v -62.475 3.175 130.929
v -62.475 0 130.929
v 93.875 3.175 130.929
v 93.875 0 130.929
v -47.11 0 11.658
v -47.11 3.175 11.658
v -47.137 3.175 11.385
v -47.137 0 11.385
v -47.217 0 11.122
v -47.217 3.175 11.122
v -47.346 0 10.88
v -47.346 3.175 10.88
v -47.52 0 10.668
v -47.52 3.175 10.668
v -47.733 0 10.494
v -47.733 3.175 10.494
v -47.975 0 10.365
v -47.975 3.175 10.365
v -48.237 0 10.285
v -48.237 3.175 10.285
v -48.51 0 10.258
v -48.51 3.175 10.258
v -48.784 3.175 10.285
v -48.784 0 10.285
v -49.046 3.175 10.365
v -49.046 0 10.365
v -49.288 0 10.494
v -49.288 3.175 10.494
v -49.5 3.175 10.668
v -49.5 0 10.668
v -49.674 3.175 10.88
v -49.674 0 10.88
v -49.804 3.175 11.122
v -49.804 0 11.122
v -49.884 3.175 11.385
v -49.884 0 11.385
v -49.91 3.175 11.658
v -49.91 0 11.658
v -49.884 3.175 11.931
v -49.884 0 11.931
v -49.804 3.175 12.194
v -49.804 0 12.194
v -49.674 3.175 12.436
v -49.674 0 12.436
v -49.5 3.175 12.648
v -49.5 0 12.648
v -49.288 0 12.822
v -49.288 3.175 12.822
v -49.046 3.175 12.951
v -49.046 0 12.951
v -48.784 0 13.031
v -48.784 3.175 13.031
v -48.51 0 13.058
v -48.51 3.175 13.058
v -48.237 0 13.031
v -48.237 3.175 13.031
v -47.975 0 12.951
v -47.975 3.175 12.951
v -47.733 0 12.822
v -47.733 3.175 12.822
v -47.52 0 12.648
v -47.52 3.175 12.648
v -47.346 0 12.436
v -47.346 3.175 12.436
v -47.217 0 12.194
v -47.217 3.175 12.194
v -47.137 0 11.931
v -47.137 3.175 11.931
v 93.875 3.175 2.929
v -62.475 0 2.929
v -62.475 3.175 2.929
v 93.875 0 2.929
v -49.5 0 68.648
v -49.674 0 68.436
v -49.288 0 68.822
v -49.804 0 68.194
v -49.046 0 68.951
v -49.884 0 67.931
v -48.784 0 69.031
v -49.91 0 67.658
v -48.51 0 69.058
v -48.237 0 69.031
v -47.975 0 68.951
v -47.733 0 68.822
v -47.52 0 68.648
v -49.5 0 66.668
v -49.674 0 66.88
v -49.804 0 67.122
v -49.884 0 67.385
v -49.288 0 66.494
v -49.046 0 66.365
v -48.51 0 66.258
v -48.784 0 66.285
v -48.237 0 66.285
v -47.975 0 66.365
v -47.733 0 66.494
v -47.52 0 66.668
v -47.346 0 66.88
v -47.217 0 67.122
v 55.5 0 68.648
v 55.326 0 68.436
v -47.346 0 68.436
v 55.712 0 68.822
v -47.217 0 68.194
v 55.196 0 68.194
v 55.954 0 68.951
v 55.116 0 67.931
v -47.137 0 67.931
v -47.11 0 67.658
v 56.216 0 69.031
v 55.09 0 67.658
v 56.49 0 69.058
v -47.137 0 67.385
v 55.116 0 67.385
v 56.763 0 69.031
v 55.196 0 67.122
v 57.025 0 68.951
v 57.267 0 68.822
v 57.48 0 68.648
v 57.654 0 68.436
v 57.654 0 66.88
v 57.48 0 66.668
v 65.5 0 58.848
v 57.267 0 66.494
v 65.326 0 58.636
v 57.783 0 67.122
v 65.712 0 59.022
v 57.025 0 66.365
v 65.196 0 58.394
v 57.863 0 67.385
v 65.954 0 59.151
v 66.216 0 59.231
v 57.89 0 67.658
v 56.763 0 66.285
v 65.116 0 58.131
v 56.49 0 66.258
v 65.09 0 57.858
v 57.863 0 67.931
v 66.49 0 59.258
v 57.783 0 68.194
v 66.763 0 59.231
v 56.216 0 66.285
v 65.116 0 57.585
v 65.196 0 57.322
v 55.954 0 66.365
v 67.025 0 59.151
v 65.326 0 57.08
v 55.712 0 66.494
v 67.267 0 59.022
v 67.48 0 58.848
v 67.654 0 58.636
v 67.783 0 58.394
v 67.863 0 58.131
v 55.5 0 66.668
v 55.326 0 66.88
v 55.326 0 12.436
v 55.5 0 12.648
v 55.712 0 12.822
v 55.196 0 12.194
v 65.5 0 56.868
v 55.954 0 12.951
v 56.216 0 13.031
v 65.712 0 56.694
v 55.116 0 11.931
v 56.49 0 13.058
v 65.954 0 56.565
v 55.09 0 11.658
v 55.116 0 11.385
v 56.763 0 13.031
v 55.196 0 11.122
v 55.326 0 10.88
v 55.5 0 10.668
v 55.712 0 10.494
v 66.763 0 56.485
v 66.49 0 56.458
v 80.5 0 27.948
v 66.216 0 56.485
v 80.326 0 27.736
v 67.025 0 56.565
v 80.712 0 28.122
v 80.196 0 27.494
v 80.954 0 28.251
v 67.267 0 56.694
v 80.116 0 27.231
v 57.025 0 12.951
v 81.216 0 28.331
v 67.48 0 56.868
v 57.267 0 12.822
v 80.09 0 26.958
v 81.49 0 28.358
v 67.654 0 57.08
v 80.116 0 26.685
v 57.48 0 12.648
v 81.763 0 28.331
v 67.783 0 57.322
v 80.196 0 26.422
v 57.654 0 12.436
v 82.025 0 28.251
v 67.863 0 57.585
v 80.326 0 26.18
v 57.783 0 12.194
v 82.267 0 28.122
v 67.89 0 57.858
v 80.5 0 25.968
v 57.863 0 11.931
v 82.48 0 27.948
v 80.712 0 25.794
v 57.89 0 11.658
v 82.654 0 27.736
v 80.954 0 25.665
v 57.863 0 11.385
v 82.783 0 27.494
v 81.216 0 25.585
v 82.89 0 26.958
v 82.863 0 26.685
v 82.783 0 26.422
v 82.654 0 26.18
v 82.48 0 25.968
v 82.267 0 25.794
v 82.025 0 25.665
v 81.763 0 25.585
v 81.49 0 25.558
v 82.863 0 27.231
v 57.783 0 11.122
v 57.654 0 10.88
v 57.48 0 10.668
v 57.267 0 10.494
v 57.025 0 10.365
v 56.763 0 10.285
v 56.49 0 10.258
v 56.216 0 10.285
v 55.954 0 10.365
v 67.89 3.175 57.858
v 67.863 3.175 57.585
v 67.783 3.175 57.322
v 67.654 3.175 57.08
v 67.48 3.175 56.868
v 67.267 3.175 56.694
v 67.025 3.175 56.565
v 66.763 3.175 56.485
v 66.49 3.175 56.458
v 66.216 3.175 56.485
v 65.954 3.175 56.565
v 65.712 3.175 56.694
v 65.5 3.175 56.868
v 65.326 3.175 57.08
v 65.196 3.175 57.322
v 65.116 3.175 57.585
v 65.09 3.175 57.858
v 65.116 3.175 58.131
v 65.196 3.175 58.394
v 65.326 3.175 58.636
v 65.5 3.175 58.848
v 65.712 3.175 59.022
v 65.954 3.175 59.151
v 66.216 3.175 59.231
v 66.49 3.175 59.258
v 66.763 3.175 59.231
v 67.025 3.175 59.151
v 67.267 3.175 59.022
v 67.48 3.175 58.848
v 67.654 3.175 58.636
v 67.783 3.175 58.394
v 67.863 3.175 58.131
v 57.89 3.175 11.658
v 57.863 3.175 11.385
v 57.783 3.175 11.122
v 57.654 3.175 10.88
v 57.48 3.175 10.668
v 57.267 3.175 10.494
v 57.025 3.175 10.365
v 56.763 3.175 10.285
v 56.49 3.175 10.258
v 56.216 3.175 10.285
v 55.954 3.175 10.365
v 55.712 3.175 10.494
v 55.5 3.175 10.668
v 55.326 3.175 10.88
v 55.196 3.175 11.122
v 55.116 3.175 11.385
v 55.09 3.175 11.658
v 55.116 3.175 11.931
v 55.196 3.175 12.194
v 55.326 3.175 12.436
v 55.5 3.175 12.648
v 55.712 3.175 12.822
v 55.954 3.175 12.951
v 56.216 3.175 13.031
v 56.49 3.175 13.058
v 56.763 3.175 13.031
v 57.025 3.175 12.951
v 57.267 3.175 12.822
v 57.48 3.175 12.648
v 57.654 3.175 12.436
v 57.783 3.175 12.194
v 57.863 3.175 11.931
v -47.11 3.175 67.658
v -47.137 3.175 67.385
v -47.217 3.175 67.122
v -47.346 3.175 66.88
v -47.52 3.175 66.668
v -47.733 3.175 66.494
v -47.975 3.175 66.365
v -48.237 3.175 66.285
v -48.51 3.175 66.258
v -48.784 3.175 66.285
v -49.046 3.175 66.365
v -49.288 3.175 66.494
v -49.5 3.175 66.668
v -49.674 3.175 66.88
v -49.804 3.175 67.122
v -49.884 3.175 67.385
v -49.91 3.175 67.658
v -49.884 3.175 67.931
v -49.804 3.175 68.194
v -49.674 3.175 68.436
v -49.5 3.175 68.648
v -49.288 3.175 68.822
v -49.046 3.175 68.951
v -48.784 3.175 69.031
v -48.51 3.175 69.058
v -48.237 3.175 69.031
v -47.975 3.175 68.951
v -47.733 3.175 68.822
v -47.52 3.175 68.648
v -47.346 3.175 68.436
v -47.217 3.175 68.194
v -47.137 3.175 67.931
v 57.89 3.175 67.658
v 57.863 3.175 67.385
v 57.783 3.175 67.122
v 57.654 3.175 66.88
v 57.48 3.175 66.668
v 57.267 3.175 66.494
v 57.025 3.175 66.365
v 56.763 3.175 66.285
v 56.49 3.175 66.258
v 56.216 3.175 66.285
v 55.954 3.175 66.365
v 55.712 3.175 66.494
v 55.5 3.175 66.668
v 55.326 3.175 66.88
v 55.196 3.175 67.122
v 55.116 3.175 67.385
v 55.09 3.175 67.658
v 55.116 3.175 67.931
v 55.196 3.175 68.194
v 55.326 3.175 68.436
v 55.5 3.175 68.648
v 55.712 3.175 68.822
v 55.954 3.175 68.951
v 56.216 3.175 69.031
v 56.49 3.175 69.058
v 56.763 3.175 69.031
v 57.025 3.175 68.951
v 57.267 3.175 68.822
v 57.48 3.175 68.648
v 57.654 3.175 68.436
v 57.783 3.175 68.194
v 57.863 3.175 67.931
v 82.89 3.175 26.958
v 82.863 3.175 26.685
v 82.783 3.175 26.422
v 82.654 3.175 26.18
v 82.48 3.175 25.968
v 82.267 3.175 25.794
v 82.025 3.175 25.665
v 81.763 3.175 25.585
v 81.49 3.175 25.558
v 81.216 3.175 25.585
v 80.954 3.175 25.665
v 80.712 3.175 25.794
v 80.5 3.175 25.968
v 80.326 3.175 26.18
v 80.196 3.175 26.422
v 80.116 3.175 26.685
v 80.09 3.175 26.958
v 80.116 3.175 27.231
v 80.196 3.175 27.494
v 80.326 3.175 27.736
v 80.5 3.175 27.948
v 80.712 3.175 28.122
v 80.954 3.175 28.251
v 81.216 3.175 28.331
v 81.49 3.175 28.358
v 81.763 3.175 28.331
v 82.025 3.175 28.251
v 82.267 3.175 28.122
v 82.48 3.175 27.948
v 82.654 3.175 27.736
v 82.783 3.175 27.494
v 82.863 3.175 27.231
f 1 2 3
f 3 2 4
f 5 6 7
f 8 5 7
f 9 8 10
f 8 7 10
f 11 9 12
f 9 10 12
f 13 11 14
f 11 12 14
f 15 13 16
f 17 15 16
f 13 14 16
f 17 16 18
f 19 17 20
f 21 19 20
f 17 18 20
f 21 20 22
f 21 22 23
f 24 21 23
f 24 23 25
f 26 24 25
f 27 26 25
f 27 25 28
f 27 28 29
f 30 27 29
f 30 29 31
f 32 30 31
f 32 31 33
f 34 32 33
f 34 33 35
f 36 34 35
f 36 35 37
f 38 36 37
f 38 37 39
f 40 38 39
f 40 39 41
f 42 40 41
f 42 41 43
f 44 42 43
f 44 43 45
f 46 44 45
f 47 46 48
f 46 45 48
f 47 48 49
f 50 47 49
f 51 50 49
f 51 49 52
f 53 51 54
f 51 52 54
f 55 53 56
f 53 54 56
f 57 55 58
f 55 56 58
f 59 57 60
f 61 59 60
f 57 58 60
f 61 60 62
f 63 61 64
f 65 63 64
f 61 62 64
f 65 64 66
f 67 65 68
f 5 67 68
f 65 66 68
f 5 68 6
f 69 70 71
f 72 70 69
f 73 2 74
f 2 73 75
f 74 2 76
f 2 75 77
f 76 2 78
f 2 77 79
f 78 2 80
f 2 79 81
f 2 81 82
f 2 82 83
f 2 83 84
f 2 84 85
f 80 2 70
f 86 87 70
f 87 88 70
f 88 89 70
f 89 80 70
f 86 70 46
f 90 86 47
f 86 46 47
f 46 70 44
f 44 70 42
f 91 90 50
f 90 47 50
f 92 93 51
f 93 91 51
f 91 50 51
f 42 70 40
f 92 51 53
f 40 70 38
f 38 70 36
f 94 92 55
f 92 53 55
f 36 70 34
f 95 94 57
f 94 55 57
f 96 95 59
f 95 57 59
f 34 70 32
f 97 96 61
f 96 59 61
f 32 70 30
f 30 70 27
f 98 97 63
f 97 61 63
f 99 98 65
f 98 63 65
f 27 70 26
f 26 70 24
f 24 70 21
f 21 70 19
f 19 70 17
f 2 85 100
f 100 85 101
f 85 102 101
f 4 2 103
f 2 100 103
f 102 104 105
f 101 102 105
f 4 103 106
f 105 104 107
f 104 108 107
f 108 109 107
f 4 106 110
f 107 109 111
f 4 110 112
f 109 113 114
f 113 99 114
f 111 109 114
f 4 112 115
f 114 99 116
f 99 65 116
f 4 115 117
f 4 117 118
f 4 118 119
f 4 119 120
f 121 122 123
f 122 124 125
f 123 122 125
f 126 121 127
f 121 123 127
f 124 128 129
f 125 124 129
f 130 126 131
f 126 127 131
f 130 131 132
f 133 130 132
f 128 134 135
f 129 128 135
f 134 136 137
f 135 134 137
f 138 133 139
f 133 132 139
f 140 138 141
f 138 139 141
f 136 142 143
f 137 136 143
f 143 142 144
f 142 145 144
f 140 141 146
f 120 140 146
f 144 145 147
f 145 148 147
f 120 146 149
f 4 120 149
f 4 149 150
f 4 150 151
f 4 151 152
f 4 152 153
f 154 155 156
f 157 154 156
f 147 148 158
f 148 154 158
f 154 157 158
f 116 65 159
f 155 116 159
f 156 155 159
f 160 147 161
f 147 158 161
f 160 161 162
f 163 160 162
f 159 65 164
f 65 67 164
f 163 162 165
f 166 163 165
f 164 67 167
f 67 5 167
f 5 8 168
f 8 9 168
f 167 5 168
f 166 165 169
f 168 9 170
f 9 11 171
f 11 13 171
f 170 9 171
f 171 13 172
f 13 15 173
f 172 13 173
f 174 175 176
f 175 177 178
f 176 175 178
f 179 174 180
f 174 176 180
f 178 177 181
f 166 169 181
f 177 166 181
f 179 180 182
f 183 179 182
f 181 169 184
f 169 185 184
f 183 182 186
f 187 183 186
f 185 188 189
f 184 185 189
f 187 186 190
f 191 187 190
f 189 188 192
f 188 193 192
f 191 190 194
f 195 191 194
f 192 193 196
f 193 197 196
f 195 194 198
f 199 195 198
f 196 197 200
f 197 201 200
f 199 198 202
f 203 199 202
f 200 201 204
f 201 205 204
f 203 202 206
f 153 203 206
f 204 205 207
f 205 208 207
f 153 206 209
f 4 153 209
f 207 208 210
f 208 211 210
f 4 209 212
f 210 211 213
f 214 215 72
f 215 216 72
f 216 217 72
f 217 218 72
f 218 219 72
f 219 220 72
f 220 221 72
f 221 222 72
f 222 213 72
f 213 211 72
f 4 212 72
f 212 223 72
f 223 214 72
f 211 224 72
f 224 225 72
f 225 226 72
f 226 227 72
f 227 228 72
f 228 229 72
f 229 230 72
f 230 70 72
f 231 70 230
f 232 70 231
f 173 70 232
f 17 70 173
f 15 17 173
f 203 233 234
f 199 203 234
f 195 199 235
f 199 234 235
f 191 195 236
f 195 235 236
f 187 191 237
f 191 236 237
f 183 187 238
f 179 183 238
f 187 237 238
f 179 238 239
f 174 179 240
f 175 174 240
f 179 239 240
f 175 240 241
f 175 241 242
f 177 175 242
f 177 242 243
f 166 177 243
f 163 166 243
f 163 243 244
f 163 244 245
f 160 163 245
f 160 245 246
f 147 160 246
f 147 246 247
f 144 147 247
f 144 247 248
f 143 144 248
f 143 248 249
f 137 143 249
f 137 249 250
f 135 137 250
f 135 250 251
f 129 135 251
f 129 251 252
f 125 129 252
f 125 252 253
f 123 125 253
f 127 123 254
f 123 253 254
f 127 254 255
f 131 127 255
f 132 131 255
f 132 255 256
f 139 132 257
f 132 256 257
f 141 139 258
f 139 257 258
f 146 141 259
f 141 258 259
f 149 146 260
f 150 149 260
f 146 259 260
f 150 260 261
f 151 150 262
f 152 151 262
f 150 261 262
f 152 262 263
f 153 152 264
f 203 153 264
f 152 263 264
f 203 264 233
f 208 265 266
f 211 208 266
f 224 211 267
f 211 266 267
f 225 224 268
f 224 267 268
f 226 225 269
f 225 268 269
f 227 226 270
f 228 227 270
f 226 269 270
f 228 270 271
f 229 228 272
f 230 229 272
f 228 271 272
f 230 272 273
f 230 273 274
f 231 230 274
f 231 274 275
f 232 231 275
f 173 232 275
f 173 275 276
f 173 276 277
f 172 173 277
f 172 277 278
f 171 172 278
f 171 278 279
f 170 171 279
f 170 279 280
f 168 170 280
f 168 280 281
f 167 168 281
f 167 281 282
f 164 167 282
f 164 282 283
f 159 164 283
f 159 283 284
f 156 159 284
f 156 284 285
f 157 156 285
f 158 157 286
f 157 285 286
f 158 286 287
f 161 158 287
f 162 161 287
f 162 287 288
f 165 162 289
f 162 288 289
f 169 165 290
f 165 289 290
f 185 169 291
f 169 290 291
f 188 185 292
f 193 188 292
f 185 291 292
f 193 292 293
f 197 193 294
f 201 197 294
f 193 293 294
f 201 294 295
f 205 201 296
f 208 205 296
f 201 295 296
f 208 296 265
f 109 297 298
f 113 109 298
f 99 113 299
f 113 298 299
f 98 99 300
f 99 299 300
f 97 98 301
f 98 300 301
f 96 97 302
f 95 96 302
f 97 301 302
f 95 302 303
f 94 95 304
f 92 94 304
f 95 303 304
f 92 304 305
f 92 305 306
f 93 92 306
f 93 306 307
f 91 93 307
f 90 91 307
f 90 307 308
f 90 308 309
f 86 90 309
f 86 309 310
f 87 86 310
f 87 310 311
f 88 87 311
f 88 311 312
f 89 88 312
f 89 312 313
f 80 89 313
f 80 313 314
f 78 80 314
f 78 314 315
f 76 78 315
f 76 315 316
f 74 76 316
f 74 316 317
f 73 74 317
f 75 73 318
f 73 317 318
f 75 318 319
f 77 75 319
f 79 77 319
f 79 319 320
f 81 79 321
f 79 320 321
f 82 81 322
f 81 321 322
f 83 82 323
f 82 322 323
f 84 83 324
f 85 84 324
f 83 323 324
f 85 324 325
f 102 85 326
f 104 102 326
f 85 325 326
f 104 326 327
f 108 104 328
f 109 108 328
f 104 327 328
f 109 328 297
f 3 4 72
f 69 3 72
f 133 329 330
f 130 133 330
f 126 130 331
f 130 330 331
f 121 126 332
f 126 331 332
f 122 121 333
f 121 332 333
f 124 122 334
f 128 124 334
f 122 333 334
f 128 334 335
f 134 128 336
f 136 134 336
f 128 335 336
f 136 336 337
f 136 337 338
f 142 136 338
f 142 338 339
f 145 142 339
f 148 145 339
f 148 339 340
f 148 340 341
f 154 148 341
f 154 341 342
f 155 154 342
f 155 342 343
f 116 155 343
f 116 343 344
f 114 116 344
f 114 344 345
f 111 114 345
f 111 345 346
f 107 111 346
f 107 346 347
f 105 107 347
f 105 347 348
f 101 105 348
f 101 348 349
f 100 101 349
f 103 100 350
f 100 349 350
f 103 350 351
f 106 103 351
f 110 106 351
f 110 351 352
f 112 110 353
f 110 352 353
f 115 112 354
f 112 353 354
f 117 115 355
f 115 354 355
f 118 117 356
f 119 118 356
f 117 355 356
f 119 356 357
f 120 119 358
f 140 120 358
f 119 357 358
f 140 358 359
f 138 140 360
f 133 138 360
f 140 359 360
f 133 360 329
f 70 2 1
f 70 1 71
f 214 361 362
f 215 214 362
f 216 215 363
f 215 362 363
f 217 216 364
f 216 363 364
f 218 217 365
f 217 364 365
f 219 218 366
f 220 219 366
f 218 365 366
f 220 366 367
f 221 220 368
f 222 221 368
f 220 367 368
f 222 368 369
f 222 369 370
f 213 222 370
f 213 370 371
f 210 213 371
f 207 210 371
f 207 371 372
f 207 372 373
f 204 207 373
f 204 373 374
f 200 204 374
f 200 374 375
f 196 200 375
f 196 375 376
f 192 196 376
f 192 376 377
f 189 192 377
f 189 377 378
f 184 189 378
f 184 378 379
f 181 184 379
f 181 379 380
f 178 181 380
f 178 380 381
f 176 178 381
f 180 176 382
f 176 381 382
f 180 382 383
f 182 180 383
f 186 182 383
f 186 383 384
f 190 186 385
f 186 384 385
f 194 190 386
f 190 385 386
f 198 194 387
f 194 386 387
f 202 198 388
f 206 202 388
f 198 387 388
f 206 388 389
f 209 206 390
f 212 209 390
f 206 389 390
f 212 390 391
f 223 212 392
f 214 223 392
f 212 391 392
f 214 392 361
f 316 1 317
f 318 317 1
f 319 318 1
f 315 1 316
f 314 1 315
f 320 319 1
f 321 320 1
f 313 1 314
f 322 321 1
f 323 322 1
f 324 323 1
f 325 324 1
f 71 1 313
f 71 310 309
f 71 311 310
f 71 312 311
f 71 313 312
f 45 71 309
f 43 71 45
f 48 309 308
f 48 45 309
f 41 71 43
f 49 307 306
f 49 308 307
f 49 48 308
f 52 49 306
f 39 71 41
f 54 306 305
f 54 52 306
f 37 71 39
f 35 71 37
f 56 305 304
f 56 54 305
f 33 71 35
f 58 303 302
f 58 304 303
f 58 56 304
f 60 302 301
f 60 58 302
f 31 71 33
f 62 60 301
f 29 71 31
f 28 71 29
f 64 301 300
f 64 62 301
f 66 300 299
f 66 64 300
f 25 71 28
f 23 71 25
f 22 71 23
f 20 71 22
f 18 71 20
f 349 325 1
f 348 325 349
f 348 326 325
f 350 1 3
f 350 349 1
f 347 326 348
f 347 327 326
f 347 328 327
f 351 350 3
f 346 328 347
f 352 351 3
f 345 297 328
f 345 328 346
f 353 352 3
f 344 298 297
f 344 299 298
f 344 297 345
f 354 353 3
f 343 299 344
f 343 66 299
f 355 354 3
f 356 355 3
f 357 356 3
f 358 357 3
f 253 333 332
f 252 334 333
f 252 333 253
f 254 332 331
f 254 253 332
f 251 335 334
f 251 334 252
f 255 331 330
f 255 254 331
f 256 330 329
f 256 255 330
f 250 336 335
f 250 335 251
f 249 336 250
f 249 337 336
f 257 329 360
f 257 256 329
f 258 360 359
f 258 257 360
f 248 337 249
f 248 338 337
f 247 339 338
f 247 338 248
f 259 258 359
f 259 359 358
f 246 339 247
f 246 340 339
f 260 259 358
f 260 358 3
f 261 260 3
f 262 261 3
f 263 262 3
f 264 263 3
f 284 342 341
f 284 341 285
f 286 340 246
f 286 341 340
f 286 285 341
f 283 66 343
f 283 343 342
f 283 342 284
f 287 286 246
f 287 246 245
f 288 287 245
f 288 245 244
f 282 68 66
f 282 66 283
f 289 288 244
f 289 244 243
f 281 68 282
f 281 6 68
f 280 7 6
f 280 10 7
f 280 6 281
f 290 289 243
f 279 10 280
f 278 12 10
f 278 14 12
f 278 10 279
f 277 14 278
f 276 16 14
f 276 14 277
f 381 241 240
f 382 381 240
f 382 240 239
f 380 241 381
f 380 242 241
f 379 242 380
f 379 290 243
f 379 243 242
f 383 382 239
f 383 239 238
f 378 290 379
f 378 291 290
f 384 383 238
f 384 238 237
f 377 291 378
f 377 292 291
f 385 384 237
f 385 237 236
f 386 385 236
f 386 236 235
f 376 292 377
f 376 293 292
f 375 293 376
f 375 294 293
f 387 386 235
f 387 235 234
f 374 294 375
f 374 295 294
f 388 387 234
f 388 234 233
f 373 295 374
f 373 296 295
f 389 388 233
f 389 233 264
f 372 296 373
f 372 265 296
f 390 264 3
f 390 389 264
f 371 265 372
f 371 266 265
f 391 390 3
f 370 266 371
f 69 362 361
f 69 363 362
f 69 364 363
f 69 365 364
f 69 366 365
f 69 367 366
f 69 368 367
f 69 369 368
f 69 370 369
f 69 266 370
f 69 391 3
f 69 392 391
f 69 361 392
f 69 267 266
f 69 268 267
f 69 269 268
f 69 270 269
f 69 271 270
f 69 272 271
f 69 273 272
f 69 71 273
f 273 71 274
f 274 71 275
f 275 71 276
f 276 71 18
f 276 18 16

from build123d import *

# Parameters (mm, degrees)
SKETCH1_W           = 156.35
SKETCH1_H           = 128
BOSS_EXTRUDE1_DEPTH = 3.175
SKETCH2_R           = 1.4
CUT_EXTRUDE1_DEPTH  = 5


with BuildPart() as part:
    # Sketch1 → Boss-Extrude1 (new body)
    with BuildSketch(Plane(origin=(0, 0, 0), x_dir=(1, 0, 0), z_dir=(0, 1, 0))):
        with Locations((15.700078044, -66.928511967)):
            Rectangle(SKETCH1_W, SKETCH1_H)
    extrude(amount=BOSS_EXTRUDE1_DEPTH)

    # Sketch2 → Cut-Extrude1 (cut)
    with BuildSketch(Plane(origin=(0, 3.175, 0), x_dir=(1, 0, 0), z_dir=(0, 1, 0))):
        with Locations((56.489578195, -67.657956471)):
            Circle(SKETCH2_R)
        with Locations((66.489578195, -57.857956471)):
            Circle(SKETCH2_R)
        with Locations((81.489578195, -26.957956471)):
            Circle(SKETCH2_R)
        with Locations((56.489578195, -11.657956471)):
            Circle(SKETCH2_R)
        with Locations((-48.510421805, -11.657956471)):
            Circle(SKETCH2_R)
        with Locations((-48.510421805, -67.657956471)):
            Circle(SKETCH2_R)
    extrude(amount=-CUT_EXTRUDE1_DEPTH, mode=Mode.SUBTRACT)


solid = part.part
